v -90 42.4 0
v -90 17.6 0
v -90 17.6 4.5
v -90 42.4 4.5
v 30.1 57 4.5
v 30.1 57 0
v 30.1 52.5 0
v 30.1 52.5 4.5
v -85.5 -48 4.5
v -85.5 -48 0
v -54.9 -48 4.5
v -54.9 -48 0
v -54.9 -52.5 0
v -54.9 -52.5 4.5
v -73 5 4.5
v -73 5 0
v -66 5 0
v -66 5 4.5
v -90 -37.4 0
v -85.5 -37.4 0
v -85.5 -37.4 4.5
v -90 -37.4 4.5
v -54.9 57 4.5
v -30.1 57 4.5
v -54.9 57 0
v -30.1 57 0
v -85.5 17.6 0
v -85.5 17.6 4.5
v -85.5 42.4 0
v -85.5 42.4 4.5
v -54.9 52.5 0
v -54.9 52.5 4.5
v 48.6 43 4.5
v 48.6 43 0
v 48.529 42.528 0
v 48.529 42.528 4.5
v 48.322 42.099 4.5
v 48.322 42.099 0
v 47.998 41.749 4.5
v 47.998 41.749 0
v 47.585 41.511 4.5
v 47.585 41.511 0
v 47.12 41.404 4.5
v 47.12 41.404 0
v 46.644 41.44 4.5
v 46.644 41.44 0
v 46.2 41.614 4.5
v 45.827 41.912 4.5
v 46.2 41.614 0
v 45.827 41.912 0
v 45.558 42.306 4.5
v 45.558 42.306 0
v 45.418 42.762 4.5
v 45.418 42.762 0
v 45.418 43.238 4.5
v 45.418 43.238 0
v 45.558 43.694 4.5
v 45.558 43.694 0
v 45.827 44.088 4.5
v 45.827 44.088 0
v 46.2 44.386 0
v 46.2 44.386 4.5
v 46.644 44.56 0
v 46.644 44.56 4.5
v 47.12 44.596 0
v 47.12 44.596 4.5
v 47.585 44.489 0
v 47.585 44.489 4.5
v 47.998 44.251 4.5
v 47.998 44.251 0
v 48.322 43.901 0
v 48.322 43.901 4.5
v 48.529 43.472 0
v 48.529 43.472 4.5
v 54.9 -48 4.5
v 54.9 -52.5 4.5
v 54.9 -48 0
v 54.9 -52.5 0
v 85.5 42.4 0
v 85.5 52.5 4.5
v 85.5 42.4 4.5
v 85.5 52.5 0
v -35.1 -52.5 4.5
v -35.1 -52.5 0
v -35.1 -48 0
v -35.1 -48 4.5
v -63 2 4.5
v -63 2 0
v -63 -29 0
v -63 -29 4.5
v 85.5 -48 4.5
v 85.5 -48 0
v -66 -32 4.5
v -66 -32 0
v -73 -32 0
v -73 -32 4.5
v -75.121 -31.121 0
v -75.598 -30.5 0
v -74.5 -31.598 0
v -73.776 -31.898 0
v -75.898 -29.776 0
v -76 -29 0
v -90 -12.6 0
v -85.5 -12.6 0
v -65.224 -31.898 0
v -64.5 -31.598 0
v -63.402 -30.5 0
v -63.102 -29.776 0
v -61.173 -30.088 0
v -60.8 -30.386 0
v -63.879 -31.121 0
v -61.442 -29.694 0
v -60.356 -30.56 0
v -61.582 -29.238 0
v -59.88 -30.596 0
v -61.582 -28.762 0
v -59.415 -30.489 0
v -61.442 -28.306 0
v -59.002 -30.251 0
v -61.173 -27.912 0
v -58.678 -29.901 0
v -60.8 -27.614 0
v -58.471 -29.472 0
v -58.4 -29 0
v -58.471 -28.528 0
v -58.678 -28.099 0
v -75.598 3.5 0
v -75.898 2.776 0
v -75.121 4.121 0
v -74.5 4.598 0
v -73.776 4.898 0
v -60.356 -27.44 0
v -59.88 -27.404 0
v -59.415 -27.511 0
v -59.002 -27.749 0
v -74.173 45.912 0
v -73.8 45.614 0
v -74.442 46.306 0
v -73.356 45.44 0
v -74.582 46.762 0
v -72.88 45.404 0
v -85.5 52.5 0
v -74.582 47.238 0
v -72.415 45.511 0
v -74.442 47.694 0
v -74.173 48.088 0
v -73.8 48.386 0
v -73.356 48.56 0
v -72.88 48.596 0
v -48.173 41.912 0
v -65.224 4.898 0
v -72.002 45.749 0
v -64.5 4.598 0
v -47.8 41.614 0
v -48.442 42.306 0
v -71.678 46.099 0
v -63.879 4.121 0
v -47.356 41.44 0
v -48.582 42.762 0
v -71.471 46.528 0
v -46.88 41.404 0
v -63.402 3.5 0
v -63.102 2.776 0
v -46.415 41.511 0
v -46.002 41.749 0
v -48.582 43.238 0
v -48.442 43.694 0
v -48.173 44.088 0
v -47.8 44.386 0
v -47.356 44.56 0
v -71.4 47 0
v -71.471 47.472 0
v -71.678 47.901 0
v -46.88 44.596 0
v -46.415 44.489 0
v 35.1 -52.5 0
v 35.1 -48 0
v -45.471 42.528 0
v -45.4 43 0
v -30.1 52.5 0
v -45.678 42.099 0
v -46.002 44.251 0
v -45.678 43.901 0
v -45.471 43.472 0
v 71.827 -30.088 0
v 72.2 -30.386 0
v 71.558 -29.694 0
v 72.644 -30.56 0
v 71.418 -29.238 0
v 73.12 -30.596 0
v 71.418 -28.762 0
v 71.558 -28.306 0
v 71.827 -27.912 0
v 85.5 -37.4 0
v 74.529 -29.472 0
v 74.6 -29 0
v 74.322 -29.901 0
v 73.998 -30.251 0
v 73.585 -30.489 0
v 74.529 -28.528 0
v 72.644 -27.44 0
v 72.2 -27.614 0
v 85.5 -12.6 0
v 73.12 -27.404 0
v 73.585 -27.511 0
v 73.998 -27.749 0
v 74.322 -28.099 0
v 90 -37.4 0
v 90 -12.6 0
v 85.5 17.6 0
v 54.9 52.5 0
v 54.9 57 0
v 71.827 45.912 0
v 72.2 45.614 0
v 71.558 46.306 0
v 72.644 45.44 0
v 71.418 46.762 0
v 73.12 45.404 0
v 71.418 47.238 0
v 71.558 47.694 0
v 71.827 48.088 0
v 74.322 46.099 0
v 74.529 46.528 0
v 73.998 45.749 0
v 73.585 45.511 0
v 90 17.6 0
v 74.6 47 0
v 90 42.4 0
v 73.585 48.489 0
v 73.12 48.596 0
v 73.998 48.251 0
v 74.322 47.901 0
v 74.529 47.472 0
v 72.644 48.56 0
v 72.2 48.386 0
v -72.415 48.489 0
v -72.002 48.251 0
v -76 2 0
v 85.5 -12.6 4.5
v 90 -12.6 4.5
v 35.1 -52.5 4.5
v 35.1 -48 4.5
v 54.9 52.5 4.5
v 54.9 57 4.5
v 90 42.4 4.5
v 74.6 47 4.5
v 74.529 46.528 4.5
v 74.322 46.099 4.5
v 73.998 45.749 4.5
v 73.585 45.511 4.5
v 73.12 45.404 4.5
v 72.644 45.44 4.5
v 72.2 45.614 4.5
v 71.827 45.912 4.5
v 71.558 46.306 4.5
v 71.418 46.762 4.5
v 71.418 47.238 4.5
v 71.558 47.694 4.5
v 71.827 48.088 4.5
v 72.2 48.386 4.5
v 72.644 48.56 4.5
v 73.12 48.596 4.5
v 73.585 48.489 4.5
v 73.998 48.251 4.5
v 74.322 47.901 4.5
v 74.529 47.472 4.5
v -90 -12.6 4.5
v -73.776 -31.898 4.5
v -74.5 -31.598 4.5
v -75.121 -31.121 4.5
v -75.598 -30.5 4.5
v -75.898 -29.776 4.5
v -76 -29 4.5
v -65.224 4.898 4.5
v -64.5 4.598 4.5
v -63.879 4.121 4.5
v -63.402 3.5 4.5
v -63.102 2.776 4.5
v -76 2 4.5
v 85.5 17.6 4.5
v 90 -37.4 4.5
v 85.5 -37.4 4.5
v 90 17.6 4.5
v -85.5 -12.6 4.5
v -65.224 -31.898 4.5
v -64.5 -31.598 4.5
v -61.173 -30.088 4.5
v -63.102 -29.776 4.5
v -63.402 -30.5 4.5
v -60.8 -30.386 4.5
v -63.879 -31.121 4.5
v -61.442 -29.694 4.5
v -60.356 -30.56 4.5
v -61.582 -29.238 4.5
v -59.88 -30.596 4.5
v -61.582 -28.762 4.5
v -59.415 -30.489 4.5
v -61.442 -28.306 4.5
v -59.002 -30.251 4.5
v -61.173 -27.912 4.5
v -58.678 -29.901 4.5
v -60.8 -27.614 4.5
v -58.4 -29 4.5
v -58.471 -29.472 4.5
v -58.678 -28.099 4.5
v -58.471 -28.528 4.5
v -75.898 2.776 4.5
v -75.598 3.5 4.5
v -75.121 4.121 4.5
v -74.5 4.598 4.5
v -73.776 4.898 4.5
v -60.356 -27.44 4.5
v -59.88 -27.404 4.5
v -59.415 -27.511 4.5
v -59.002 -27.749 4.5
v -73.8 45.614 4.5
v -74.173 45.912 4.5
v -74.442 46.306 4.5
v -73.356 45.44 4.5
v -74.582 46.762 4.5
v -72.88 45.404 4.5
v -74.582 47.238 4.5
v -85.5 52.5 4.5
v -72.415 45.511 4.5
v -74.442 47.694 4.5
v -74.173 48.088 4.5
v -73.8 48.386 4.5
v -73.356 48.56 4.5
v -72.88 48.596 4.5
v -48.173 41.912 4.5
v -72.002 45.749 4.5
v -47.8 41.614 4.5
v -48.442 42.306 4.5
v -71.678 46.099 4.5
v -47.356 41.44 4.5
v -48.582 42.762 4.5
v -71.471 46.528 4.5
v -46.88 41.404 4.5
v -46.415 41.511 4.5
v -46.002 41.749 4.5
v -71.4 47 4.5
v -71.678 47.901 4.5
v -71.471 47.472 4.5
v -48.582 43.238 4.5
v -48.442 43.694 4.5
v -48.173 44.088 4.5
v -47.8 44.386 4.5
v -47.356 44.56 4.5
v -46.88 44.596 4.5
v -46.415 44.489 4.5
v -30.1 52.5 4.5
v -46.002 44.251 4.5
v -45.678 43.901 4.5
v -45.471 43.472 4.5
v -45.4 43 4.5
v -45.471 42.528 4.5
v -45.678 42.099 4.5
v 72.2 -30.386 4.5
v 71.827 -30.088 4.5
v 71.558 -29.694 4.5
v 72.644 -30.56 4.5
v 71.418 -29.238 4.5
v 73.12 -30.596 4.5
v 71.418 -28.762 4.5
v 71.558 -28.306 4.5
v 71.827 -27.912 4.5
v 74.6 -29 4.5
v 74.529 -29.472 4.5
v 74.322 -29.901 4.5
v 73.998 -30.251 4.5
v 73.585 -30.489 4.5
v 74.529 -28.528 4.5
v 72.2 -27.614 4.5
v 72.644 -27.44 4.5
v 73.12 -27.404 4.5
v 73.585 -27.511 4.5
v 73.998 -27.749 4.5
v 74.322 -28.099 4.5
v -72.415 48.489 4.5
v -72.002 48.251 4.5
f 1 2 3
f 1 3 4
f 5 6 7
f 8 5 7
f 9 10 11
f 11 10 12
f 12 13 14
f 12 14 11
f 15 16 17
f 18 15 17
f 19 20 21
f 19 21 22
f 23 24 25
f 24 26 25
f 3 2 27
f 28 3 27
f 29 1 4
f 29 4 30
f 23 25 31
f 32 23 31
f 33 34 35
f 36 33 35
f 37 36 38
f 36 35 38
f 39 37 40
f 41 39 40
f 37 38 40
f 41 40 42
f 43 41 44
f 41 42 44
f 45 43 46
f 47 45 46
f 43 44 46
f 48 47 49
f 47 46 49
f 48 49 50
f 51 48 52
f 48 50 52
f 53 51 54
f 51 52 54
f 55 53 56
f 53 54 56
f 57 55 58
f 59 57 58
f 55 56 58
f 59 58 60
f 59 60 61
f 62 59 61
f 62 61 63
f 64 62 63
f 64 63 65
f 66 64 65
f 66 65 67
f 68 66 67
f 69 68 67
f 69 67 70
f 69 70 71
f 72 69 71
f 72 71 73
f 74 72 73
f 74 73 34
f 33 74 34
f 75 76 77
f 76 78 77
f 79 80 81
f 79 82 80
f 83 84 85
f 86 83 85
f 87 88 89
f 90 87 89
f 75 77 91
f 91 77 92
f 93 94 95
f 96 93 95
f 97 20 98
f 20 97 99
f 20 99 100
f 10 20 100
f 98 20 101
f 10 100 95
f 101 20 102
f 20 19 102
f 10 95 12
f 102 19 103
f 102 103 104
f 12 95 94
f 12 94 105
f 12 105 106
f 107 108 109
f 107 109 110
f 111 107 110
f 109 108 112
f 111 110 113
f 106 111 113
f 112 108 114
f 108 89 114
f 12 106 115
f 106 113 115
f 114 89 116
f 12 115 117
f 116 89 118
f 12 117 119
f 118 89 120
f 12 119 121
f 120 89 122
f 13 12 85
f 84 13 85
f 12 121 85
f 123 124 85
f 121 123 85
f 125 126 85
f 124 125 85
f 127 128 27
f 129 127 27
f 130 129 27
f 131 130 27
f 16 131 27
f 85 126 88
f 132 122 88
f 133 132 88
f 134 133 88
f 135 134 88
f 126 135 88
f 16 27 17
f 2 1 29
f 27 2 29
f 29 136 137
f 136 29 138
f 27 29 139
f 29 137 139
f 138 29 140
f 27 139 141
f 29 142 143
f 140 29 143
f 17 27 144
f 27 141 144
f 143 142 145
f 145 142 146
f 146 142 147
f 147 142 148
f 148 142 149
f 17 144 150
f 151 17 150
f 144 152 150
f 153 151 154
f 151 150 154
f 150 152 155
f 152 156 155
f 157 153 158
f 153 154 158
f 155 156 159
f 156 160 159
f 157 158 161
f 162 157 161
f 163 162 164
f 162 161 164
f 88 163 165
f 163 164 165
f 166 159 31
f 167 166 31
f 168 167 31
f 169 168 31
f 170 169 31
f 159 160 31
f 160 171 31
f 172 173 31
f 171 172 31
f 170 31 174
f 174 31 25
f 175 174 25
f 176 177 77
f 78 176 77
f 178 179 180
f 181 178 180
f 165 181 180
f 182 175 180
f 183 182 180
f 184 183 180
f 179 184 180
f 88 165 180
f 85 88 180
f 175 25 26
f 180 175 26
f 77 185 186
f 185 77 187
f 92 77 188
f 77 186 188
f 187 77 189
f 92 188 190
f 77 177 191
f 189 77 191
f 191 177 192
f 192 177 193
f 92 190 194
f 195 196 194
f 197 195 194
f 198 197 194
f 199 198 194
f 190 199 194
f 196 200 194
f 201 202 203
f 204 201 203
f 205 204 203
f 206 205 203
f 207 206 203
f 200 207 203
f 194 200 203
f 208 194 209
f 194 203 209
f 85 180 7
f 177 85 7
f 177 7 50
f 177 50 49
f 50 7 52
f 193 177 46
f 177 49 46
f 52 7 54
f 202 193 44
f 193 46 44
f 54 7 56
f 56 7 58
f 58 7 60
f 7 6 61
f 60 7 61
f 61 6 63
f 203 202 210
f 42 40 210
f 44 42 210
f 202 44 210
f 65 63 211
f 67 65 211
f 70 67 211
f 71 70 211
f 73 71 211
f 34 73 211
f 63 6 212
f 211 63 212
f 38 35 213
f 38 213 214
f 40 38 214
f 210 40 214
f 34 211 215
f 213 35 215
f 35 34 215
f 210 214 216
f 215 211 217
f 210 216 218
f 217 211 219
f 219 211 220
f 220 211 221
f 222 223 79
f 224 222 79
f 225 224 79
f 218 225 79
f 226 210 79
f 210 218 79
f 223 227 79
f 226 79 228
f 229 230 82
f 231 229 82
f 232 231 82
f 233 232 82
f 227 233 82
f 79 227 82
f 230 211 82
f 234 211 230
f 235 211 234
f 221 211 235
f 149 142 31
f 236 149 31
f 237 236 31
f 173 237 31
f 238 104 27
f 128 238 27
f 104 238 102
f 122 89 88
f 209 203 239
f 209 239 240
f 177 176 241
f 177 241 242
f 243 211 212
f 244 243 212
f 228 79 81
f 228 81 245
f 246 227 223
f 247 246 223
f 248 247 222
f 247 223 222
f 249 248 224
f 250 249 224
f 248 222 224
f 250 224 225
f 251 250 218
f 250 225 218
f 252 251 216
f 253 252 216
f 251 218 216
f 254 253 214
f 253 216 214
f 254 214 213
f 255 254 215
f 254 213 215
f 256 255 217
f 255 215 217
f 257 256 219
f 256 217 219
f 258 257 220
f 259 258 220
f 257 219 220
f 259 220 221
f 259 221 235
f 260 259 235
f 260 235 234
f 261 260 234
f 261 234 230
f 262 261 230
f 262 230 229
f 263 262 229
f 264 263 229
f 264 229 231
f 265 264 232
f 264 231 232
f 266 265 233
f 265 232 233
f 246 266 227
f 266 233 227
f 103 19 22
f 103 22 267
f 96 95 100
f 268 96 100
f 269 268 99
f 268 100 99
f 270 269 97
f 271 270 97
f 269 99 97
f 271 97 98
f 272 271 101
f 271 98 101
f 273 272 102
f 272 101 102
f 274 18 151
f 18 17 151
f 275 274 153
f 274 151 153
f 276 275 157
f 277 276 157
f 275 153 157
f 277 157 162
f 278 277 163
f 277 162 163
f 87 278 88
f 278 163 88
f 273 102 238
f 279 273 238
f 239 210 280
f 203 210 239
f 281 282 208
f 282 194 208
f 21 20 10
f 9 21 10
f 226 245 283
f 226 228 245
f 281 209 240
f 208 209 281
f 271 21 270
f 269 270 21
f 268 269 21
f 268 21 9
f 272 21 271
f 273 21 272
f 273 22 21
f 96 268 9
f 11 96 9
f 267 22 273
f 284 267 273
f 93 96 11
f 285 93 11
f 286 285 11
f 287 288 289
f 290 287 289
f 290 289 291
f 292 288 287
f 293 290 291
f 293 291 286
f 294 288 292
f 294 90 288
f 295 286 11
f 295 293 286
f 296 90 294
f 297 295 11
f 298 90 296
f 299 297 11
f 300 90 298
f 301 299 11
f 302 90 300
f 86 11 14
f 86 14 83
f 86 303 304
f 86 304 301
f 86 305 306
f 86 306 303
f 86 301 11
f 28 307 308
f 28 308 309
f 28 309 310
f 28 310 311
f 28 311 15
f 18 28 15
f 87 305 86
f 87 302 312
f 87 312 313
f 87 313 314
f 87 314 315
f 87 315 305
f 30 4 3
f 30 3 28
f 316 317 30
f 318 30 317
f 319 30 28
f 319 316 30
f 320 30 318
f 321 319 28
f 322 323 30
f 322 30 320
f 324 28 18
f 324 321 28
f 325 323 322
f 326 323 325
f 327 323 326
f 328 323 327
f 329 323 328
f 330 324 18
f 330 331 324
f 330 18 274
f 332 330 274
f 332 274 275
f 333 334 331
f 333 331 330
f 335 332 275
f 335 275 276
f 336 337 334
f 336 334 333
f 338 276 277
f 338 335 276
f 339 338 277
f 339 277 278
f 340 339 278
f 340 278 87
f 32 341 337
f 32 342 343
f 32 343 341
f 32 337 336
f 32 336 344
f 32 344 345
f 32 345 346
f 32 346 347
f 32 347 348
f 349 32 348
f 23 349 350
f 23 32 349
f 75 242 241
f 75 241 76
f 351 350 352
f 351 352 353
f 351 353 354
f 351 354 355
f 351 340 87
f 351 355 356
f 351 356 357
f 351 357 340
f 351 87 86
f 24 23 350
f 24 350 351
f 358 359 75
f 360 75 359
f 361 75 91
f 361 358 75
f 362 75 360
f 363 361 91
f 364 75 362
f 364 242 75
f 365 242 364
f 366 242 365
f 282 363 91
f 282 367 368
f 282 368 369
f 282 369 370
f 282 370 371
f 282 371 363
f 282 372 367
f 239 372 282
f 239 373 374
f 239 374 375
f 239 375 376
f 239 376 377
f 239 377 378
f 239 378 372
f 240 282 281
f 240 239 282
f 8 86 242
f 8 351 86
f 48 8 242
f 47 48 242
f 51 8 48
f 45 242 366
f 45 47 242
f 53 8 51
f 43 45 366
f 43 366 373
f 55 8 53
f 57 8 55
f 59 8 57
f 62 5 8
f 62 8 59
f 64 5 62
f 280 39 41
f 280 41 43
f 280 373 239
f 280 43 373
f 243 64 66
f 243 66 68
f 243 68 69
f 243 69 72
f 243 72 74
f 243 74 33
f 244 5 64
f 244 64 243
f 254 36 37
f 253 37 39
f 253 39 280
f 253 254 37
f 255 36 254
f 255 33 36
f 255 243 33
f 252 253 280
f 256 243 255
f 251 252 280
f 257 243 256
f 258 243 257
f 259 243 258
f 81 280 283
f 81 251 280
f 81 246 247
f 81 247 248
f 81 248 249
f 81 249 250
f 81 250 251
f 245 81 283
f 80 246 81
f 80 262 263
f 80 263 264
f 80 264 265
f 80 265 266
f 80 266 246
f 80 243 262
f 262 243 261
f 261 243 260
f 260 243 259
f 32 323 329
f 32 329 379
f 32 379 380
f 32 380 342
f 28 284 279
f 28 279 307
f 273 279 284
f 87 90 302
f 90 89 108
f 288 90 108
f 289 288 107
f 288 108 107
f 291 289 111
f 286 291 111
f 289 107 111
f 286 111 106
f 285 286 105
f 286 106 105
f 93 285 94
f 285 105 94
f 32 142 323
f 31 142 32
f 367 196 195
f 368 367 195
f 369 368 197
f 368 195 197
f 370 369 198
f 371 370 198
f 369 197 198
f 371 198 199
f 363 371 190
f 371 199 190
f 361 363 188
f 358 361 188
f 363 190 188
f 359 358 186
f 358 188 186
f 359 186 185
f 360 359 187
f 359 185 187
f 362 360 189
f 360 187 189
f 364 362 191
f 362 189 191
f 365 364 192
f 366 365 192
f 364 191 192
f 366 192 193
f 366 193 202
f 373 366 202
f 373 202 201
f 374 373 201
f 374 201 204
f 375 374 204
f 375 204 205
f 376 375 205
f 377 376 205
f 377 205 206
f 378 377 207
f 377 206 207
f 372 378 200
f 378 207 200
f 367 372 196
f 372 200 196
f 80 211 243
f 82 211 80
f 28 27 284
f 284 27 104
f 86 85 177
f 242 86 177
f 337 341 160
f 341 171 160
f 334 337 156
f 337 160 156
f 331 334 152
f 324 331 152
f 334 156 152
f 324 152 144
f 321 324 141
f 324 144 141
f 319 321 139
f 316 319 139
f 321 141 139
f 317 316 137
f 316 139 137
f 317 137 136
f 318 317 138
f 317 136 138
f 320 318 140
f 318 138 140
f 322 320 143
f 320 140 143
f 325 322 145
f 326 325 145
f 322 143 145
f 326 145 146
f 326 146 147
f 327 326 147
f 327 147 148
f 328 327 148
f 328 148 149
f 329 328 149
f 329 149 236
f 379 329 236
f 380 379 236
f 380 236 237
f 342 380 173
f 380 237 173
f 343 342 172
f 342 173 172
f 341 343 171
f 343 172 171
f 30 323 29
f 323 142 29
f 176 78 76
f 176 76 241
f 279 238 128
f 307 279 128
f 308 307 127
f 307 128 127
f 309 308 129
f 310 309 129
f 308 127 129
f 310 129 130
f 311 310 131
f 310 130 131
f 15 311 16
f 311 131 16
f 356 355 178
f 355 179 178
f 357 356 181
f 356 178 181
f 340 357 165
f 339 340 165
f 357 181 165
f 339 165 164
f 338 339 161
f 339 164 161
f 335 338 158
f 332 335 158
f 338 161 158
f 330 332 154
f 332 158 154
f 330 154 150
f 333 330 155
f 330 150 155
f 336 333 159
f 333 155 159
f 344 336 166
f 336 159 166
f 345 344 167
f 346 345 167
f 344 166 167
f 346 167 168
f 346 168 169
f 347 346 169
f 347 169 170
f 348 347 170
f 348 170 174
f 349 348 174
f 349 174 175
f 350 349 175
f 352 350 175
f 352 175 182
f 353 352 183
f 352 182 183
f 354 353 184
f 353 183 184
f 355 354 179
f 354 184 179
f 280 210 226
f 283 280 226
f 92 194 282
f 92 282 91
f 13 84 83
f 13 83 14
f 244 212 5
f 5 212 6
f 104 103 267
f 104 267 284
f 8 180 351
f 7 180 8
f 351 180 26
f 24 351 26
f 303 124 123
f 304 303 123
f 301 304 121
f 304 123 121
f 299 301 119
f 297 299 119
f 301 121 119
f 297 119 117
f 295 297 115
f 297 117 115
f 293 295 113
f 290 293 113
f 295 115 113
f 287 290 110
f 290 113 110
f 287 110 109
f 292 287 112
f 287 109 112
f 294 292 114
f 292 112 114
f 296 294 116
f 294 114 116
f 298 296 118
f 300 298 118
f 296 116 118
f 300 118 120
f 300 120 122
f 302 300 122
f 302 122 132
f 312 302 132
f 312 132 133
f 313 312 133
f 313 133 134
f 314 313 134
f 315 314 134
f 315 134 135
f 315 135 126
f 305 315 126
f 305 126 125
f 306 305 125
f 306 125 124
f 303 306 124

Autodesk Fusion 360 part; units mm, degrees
sketch "Sketch1" plane through (0, 0, 0) normal (0, 0, 1) x (1, 0, 0)
  line L0 (90, -52.5) -> (-90, -52.5)
  line L1 (-90, -52.5) -> (-90, 52.5)
  line L2 (-90, 52.5) -> (90, 52.5)
  line L3 (90, 52.5) -> (90, -52.5)
  line L4 (90, -52.5) -> (-90, 52.5) construction
  line L5 (-90, -52.5) -> (90, 52.5) construction
  line L6 (-85.5, 52.5) -> (-85.5, -52.5)
  line L7 (85.5, 52.5) -> (85.5, -52.5)
  line L8 (-90, -48) -> (90, -48)
  line L9 (-90, -52.5) -> (-55, -52.5)
  line L10 (-55, -52.5) -> (-55, -48)
  line L11 (-55, -48) -> (-90, -48)
  line L12 (-90, -48) -> (-90, -52.5)
  line L13 (-55, -52.5) -> (-35, -52.5)
  line L14 (-35, -52.5) -> (-35, -48)
  line L15 (-35, -48) -> (-55, -48)
  line L16 (-55, -48) -> (-55, -52.5)
  line L17 (90, -52.5) -> (55, -52.5)
  line L18 (55, -52.5) -> (55, -48)
  line L19 (55, -48) -> (90, -48)
  line L20 (90, -48) -> (90, -52.5)
  line L21 (-90, -52.5) -> (-85.5, -52.5)
  line L22 (-85.5, -52.5) -> (-85.5, -37.5)
  line L23 (-85.5, -37.5) -> (-90, -37.5)
  line L24 (-90, -37.5) -> (-90, -52.5)
  line L25 (90, -52.5) -> (85.5, -52.5)
  line L26 (85.5, -52.5) -> (85.5, -37.5)
  line L27 (85.5, -37.5) -> (90, -37.5)
  line L28 (90, -37.5) -> (90, -52.5)
  line L29 (-85.5, -37.5) -> (-90, -37.5)
  line L30 (-90, -37.5) -> (-90, -12.5)
  line L31 (-90, -12.5) -> (-85.5, -12.5)
  line L32 (-85.5, -12.5) -> (-85.5, -37.5)
  line L33 (90, -37.5) -> (85.5, -37.5)
  line L34 (85.5, -37.5) -> (85.5, -12.5)
  line L35 (85.5, -12.5) -> (90, -12.5)
  line L36 (90, -12.5) -> (90, -37.5)
  line L37 (-85.5, -12.5) -> (-90, -12.5)
  line L38 (-90, -12.5) -> (-90, 17.5)
  line L39 (-90, 17.5) -> (-85.5, 17.5)
  line L40 (-85.5, 17.5) -> (-85.5, -12.5)
  line L41 (-85.5, 17.5) -> (-90, 17.5)
  line L42 (-90, 17.5) -> (-90, 42.5)
  line L43 (-90, 42.5) -> (-85.5, 42.5)
  line L44 (-85.5, 42.5) -> (-85.5, 17.5)
  line L45 (90, -12.5) -> (85.5, -12.5)
  line L46 (85.5, -12.5) -> (85.5, 17.5)
  line L47 (85.5, 17.5) -> (90, 17.5)
  line L48 (90, 17.5) -> (90, -12.5)
  line L49 (90, 17.5) -> (85.5, 17.5)
  line L50 (85.5, 17.5) -> (85.5, 42.5)
  line L51 (85.5, 42.5) -> (90, 42.5)
  line L52 (90, 42.5) -> (90, 17.5)
  line L53 (55, -52.5) -> (35, -52.5)
  line L54 (35, -52.5) -> (35, -48)
  line L55 (35, -48) -> (55, -48)
  line L56 (55, -48) -> (55, -52.5)
  line L57 (-90, 43) -> (90, 43) construction
  line L58 (0, 43) -> (0, 40) construction
  circle A0 centre (47, 43) radius 1.6
  circle A1 centre (-47, 43) radius 1.6
  line L59 (-90, 47) -> (90, 47) construction
  circle A2 centre (73, 47) radius 1.6
  circle A3 centre (-73, 47) radius 1.6
  circle A4 centre (73, -29) radius 1.6
  circle A5 centre (-60, -29) radius 1.6
  line L60 (-66, -32) -> (-73, -32)
  line L61 (-76, -29) -> (-76, 2)
  line L62 (-73, 5) -> (-66, 5)
  line L63 (-63, 2) -> (-63, -29)
  line L64 (-63, -32) -> (-76, 5) construction
  line L65 (-76, -32) -> (-63, 5) construction
  arc A6 (-63, 2) -> (-66, 5) centre (-66, 2) ccw
  arc A7 (-73, 5) -> (-76, 2) centre (-73, 2) ccw
  arc A8 (-76, -29) -> (-73, -32) centre (-73, -29) ccw
  arc A9 (-66, -32) -> (-63, -29) centre (-66, -29) ccw
  line L66 (-55, 52.5) -> (-30, 52.5)
  line L67 (-30, 52.5) -> (-30, 57)
  line L68 (-30, 57) -> (-55, 57)
  line L69 (-55, 57) -> (-55, 52.5)
  line L70 (30, 52.5) -> (55, 52.5)
  line L71 (55, 52.5) -> (55, 57)
  line L72 (55, 57) -> (30, 57)
  line L73 (30, 57) -> (30, 52.5)
  point P0 (-69.5, -13.5)
  dimension "d1" = 180
  dimension "d2" = 105
  dimension "d3" = 4.5
  dimension "d4" = 4.5
  dimension "d5" = 4.5
  dimension "d6" = 35
  dimension "d7" = 20
  dimension "d8" = 35
  dimension "d10" = 15
  dimension "d11" = 15
  dimension "d12" = 25
  dimension "d13" = 25
  dimension "d14" = 30
  dimension "d15" = 25
  dimension "d16" = 30
  dimension "d17" = 25
  dimension "d18" = 20
  dimension "d20" = 91
  dimension "d21" = 3.2
  dimension "d22" = 3.2
  dimension "d23" = 47
  dimension "d24" = 47
  dimension "d25" = 4
  dimension "d26" = 3.2
  dimension "d27" = 3.2
  dimension "d28" = 73
  dimension "d29" = 73
  dimension "d30" = 3.2
  dimension "d31" = 72
  dimension "d32" = 3.2
  dimension "d33" = 72
  dimension "d34" = 60
  dimension "d35" = 13
  dimension "d36" = 37
  dimension "d37" = 3
  dimension "d38" = 3
  dimension "d39" = 3
  dimension "d40" = 3
  dimension "d41" = 3
  dimension "d42" = 3
  dimension "d48" = 25
  dimension "d49" = 4.5
  dimension "d50" = 25
  dimension "d51" = 4.5
  dimension "d52" = 35
  dimension "d53" = 35
extrude "Extrude1" add sketch "Sketch1" along normal blind 4.5 contours L0 L8 L18 L53 L54 L55 L56 | L2 L6 L7 L8 L11 L15 L19 L22 L26 L32 L34 L40 L44 L46 L50 L55 L66 L70 | L3 L7 L27 L33 L34 L35 L36 L45 | L0 L8 L10 L13 L14 L15 L16 | L3 L7 L47 L49 L50 L51 L52 | L1 L6 L23 L29 L30 L31 L32 L37 | L2 L70 L71 L72 L73 | L1 L6 L39 L41 L42 L43 L44 | L2 L66 L67 L68 L69
move_face "OffsetFaces1" offset -0.1 4 faces at (55, -51, 1.5) (-35, -51, 1.5) (-30, 54, 1.5) (55, 54, 1.5)
move_face "OffsetFaces2" offset -0.1 4 faces at (35, -51, 1.5) (-55, -51, 1.5) (30, 55.5, 1.5) (-55, 55.5, 1.5)
move_face "OffsetFaces3" offset -0.1 4 faces at (-88.5, 17.5, 1.5) (-87, -37.5, 1.5) (87, -37.5, 1.5) (87, 17.5, 1.5)
move_face "OffsetFaces4" offset -0.1 4 faces at (-88.5, 42.5, 1.5) (-88.5, -12.5, 1.5) (87, 42.5, 1.5) (87, -12.5, 1.5)
equation "TabRelief = -0.1 mm"
equation "d55 = TabRelief"
equation "d56 = TabRelief"
equation "d57 = TabRelief"
equation "d58 = TabRelief"
